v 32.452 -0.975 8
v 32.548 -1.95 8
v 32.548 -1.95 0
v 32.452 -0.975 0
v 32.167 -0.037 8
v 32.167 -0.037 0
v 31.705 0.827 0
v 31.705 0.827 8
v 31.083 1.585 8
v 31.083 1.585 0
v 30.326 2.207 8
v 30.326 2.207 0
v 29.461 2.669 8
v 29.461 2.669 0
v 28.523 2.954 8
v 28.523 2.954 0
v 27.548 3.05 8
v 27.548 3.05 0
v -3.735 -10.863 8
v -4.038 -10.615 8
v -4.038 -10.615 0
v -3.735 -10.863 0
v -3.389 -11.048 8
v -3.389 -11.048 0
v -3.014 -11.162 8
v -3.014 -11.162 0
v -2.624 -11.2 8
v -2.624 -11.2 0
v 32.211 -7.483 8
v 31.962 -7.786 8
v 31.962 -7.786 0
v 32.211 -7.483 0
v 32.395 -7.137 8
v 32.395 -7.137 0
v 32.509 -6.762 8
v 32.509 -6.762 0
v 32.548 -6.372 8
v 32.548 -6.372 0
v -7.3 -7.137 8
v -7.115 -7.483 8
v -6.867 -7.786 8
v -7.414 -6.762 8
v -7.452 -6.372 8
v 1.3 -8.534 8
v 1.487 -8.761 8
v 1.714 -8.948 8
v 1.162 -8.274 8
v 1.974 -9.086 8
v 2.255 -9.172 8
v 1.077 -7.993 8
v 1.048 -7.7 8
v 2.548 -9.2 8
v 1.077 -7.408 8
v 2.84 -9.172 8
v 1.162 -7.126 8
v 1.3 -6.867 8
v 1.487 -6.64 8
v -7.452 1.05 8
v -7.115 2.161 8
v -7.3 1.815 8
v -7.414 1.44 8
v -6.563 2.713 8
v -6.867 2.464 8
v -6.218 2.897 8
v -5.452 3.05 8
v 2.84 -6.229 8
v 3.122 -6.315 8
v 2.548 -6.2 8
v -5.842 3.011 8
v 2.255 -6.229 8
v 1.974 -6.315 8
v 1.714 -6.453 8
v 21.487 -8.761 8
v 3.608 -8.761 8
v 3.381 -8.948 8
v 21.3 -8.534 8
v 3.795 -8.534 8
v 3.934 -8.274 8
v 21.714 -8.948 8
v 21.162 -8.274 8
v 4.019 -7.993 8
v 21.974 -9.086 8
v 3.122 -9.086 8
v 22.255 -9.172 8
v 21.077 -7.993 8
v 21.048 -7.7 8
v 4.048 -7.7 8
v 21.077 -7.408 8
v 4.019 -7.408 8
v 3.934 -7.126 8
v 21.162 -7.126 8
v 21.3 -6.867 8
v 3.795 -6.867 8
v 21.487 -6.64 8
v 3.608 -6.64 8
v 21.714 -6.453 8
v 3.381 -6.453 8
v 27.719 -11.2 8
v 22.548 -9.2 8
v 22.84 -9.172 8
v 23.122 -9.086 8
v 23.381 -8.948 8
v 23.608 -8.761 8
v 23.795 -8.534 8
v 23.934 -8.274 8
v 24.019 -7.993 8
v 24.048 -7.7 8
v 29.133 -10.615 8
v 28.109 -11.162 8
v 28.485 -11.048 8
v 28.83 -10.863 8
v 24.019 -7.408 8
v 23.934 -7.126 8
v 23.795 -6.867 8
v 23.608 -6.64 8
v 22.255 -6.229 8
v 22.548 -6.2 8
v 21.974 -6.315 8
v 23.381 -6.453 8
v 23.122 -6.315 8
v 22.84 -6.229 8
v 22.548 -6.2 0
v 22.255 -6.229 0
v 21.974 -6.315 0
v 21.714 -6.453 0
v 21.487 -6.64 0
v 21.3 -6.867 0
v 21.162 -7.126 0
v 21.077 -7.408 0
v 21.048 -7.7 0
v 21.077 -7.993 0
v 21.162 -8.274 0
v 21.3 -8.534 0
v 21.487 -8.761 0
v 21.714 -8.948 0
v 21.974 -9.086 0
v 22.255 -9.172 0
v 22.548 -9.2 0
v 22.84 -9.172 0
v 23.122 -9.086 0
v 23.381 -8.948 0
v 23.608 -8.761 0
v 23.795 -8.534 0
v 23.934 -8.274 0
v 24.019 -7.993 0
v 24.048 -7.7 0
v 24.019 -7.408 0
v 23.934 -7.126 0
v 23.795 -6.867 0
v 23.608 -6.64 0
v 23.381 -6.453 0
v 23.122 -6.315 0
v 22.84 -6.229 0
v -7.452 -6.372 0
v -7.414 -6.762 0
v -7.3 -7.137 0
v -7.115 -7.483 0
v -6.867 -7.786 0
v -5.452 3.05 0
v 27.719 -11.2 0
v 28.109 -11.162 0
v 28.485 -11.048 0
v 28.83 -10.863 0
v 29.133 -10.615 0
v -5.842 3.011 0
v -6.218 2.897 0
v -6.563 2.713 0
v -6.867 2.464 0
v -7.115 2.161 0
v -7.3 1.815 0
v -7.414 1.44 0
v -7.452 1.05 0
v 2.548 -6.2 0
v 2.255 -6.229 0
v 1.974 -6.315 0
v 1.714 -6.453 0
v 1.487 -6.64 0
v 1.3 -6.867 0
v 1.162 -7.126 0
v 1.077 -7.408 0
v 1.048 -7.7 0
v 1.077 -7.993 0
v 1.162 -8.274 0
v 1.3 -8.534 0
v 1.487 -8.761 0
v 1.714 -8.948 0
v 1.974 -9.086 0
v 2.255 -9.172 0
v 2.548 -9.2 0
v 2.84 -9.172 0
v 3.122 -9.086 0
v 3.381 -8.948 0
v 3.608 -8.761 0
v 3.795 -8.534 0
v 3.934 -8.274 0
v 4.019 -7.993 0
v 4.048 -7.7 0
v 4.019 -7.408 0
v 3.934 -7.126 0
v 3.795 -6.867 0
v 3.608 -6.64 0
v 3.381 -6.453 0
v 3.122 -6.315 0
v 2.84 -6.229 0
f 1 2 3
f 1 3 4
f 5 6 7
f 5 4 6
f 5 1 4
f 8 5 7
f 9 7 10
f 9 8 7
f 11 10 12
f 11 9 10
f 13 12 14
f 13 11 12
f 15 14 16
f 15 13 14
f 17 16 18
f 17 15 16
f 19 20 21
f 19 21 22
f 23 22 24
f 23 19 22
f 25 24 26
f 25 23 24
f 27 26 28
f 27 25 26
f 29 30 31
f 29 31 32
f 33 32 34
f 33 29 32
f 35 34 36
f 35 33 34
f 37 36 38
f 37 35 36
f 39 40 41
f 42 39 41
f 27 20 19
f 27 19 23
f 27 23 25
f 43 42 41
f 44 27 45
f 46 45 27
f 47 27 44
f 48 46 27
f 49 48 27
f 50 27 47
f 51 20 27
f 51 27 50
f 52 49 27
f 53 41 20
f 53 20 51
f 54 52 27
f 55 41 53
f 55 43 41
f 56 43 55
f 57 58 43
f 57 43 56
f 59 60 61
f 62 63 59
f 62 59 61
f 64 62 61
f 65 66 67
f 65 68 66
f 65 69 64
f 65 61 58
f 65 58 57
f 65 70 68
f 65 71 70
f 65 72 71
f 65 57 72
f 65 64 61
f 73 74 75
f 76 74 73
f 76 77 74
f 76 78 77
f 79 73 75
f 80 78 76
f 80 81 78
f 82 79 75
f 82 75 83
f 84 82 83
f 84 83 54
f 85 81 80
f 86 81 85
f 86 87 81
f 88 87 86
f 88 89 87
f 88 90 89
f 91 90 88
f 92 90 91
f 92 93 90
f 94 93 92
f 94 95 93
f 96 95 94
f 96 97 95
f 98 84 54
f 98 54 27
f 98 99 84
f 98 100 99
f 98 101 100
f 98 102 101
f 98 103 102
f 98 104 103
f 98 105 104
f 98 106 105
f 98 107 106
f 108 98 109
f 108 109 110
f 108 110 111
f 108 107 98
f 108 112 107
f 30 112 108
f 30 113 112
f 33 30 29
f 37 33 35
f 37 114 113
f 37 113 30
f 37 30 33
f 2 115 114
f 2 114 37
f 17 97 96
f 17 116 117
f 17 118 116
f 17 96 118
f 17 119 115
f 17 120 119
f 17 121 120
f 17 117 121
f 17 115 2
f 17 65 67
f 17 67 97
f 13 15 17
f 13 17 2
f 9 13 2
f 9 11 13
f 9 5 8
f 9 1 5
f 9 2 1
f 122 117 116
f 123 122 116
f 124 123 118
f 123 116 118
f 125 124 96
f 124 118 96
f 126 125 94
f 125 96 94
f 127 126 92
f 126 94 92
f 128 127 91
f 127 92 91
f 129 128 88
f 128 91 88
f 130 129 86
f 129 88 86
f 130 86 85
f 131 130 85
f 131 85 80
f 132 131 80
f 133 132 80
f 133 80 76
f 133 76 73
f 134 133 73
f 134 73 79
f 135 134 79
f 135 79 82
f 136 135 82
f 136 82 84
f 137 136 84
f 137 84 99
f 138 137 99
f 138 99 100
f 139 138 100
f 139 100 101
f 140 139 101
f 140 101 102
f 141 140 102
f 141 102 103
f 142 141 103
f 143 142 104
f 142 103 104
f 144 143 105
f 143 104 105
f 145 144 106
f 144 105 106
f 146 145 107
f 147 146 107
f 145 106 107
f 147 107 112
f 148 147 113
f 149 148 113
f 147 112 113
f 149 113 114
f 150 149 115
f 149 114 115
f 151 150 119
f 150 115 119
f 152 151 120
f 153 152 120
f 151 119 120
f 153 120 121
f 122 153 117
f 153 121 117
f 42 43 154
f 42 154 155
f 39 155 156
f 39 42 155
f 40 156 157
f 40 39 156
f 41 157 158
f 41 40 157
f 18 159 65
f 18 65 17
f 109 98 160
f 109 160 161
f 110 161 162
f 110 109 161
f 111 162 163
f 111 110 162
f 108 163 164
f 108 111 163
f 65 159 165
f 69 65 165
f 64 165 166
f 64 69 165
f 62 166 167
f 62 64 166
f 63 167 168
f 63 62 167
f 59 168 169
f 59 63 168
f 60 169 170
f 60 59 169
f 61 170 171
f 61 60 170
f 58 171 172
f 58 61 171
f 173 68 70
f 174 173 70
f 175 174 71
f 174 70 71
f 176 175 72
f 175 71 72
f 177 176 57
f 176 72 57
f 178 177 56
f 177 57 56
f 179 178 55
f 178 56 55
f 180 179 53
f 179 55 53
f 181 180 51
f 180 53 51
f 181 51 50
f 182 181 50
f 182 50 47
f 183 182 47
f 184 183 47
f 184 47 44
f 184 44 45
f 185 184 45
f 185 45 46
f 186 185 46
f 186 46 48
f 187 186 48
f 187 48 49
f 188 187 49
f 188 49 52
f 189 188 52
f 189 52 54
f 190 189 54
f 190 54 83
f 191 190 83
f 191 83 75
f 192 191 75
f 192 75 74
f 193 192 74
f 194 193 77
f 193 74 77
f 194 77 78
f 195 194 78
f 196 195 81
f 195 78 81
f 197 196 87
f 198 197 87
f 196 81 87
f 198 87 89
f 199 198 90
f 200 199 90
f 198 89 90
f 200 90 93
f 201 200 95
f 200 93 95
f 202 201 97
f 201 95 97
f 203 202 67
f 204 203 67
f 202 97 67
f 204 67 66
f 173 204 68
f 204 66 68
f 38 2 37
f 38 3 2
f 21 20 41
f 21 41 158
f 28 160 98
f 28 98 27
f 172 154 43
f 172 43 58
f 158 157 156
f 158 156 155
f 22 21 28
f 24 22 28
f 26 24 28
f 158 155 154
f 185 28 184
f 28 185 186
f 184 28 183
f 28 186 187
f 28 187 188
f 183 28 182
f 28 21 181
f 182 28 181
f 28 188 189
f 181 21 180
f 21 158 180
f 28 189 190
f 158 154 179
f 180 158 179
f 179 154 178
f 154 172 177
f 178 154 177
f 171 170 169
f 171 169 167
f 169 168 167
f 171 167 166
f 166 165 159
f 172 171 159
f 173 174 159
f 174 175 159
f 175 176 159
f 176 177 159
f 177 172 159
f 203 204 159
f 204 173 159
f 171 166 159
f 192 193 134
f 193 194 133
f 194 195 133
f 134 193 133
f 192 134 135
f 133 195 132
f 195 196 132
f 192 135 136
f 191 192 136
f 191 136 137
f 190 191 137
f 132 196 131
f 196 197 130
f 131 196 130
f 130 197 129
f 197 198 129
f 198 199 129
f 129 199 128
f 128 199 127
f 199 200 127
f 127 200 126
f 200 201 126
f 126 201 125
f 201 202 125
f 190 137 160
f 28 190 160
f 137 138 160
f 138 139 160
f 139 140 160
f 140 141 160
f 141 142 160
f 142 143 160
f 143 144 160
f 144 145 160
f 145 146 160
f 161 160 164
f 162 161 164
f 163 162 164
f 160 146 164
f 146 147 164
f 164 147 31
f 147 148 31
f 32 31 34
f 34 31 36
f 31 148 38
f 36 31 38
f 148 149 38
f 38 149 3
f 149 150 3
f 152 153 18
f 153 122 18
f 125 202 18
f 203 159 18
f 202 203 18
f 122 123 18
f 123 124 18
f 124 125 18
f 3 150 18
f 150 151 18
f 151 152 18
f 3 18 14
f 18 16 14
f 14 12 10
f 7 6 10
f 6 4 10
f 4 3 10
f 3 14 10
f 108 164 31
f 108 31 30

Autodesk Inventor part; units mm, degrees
ref_plane "YZ Plane" through (0, 0, 0) normal (1, 0, 0) x (0, 1, 0)
ref_plane "XZ Plane" through (0, 0, 0) normal (0, 1, 0) x (-1, 0, 0)
ref_plane "XY Plane" through (0, 0, 0) normal (0, 0, 1) x (1, 0, 0)
sketch "Szkic1" plane through (0, 0, 0) normal (0, 0, 1) x (1, 0, 0)
  line L0 (-7.4523, 3.0496) -> (32.5477, 3.0496)
  line L1 (32.5477, 3.0496) -> (32.5477, -11.2004)
  line L2 (32.5477, -11.2004) -> (-7.4523, -11.2004)
  line L3 (-7.4523, -11.2004) -> (-7.4523, 3.0496)
  point P0 (0, 0)
  point P1 (2.5477, -7.7004)
  point P2 (22.5477, -7.7004)
  dimension "d0" = 40
  dimension "d1" = 14.25
  dimension "d2" = 3.5
  dimension "d3" = 3.5
  dimension "d4" = 10
  dimension "d5" = 10
extrude "Wyciągnięcie proste1" add sketch "Szkic1" along normal blind 8
hole "Otwór1" at (2.5477, -7.7004, 0) at (22.5477, -7.7004, 0) direction (0, 0, 1) diameter 3 end through all
chamfer "Faza1" distance 4 angle 45 2 edges at (-7.4523, -11.2004, 4) (32.5477, -11.2004, 4)
fillet "Zaokrąglenie1" radius 2 4 edges at (32.5477, -7.2004, 4) (28.5477, -11.2004, 4) (-3.4523, -11.2004, 4) (-7.4523, -7.2004, 4)
fillet "Zaokrąglenie4" radius 5 1 edges at (32.5477, 3.0496, 4)
fillet "Zaokrąglenie5" radius 2 1 edges at (-7.4523, 3.0496, 4)
properties part number "3DP_ABS_Y_Axis_Cable_Chain_Mounting_Bracket"
